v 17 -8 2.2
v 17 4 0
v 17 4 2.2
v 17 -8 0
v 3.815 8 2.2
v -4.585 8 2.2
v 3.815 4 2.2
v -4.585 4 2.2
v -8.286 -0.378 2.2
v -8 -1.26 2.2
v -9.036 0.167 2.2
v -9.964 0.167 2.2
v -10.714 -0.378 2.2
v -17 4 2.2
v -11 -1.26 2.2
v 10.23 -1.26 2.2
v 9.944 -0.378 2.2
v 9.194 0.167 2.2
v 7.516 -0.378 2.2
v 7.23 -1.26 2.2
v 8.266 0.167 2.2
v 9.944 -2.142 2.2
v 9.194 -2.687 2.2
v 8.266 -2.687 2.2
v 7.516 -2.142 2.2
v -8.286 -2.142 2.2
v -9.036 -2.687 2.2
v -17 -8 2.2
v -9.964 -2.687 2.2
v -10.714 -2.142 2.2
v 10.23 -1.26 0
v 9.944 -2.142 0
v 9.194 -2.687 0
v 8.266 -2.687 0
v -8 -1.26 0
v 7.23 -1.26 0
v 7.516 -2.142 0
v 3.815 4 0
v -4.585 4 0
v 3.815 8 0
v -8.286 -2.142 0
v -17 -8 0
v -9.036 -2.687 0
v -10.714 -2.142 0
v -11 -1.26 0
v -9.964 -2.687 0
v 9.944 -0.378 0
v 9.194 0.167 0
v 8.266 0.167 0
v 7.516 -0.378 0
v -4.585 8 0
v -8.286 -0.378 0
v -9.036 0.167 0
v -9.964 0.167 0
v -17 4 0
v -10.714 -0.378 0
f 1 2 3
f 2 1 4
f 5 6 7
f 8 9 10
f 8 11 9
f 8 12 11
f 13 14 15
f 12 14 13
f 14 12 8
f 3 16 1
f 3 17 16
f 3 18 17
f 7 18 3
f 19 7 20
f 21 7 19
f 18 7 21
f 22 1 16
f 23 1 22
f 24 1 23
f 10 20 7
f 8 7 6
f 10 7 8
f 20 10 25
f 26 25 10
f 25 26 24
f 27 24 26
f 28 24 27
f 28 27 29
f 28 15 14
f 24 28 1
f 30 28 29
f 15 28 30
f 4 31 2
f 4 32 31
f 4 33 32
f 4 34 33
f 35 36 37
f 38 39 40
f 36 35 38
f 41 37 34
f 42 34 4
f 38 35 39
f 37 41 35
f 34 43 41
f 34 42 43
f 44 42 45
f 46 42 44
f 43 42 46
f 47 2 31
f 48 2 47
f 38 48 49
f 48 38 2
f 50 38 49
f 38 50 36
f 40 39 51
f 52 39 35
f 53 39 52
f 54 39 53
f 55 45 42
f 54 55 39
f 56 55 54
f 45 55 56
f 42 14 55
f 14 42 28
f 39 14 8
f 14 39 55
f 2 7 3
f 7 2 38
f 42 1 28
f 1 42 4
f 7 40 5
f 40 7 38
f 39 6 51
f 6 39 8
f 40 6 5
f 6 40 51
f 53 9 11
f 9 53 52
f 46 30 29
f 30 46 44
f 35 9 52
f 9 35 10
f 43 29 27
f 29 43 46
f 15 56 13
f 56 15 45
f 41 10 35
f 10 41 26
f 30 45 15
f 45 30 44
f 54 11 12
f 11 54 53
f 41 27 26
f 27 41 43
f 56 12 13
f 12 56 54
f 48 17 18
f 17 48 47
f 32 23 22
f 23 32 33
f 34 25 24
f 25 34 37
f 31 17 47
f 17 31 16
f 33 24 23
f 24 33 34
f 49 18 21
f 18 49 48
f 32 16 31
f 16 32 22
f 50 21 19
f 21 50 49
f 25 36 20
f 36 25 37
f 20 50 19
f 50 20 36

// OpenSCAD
/* Replacement bit for thermal cycler in Lab.
Requirements:
	- Bit Length and Depth
	- Two screw-holes flanking tab.
		- Distances from bit end.
		- Radius
	- Tab poking out that can hold lid.
		- Tab distance from bit end.
		- Tab Width
		- Tab Depth
		- Tab Bevel
	- Thickness overall
	
*/

// ===Parameters===
// ----- Global -----
Thickness = 2.2;
$fn = 10;

// ----- Spine -----
SpineDepth = 12; // How deep it is from the root of the tabs to the back of the thing.
SpineLength = 34; // How long the thing is overall from one end to the other.

// ----- Tab -----
TabDepth = 16; //How much depth has the tab? NB: Measures from back of spine!
TabLength = 8.4; //How long a tab is from one side to another
TabDistance = 12.415; //How far from one end of the spine does the tab start?

// ----- Screw Holes -----
Screw1Distance = 7.5;
Screw2Distance = 25.73;
ScrewHoleRadius = 1.5;
ScrewHoleInset = 6.74;

// ===Modelling===
difference(){
	union(){
	// Spine:
	translate([-SpineLength/2,-TabDepth/2,0])
		cube([SpineLength,SpineDepth,Thickness]);

	// Tab:
	translate([TabDistance-SpineLength/2,-TabDepth/2,0])
		cube([TabLength,TabDepth,Thickness]); // Tab
	}

	// Screwholes:
	translate([Screw1Distance-SpineLength/2, ScrewHoleInset-TabDepth/2, Thickness/2])
		linear_extrude(height = Thickness*1.2, center = true)
			circle(r=ScrewHoleRadius);

	translate([Screw2Distance-SpineLength/2, ScrewHoleInset-TabDepth/2, Thickness/2])
		linear_extrude(height = Thickness*1.2, center = true)
			circle(r=ScrewHoleRadius);

}
